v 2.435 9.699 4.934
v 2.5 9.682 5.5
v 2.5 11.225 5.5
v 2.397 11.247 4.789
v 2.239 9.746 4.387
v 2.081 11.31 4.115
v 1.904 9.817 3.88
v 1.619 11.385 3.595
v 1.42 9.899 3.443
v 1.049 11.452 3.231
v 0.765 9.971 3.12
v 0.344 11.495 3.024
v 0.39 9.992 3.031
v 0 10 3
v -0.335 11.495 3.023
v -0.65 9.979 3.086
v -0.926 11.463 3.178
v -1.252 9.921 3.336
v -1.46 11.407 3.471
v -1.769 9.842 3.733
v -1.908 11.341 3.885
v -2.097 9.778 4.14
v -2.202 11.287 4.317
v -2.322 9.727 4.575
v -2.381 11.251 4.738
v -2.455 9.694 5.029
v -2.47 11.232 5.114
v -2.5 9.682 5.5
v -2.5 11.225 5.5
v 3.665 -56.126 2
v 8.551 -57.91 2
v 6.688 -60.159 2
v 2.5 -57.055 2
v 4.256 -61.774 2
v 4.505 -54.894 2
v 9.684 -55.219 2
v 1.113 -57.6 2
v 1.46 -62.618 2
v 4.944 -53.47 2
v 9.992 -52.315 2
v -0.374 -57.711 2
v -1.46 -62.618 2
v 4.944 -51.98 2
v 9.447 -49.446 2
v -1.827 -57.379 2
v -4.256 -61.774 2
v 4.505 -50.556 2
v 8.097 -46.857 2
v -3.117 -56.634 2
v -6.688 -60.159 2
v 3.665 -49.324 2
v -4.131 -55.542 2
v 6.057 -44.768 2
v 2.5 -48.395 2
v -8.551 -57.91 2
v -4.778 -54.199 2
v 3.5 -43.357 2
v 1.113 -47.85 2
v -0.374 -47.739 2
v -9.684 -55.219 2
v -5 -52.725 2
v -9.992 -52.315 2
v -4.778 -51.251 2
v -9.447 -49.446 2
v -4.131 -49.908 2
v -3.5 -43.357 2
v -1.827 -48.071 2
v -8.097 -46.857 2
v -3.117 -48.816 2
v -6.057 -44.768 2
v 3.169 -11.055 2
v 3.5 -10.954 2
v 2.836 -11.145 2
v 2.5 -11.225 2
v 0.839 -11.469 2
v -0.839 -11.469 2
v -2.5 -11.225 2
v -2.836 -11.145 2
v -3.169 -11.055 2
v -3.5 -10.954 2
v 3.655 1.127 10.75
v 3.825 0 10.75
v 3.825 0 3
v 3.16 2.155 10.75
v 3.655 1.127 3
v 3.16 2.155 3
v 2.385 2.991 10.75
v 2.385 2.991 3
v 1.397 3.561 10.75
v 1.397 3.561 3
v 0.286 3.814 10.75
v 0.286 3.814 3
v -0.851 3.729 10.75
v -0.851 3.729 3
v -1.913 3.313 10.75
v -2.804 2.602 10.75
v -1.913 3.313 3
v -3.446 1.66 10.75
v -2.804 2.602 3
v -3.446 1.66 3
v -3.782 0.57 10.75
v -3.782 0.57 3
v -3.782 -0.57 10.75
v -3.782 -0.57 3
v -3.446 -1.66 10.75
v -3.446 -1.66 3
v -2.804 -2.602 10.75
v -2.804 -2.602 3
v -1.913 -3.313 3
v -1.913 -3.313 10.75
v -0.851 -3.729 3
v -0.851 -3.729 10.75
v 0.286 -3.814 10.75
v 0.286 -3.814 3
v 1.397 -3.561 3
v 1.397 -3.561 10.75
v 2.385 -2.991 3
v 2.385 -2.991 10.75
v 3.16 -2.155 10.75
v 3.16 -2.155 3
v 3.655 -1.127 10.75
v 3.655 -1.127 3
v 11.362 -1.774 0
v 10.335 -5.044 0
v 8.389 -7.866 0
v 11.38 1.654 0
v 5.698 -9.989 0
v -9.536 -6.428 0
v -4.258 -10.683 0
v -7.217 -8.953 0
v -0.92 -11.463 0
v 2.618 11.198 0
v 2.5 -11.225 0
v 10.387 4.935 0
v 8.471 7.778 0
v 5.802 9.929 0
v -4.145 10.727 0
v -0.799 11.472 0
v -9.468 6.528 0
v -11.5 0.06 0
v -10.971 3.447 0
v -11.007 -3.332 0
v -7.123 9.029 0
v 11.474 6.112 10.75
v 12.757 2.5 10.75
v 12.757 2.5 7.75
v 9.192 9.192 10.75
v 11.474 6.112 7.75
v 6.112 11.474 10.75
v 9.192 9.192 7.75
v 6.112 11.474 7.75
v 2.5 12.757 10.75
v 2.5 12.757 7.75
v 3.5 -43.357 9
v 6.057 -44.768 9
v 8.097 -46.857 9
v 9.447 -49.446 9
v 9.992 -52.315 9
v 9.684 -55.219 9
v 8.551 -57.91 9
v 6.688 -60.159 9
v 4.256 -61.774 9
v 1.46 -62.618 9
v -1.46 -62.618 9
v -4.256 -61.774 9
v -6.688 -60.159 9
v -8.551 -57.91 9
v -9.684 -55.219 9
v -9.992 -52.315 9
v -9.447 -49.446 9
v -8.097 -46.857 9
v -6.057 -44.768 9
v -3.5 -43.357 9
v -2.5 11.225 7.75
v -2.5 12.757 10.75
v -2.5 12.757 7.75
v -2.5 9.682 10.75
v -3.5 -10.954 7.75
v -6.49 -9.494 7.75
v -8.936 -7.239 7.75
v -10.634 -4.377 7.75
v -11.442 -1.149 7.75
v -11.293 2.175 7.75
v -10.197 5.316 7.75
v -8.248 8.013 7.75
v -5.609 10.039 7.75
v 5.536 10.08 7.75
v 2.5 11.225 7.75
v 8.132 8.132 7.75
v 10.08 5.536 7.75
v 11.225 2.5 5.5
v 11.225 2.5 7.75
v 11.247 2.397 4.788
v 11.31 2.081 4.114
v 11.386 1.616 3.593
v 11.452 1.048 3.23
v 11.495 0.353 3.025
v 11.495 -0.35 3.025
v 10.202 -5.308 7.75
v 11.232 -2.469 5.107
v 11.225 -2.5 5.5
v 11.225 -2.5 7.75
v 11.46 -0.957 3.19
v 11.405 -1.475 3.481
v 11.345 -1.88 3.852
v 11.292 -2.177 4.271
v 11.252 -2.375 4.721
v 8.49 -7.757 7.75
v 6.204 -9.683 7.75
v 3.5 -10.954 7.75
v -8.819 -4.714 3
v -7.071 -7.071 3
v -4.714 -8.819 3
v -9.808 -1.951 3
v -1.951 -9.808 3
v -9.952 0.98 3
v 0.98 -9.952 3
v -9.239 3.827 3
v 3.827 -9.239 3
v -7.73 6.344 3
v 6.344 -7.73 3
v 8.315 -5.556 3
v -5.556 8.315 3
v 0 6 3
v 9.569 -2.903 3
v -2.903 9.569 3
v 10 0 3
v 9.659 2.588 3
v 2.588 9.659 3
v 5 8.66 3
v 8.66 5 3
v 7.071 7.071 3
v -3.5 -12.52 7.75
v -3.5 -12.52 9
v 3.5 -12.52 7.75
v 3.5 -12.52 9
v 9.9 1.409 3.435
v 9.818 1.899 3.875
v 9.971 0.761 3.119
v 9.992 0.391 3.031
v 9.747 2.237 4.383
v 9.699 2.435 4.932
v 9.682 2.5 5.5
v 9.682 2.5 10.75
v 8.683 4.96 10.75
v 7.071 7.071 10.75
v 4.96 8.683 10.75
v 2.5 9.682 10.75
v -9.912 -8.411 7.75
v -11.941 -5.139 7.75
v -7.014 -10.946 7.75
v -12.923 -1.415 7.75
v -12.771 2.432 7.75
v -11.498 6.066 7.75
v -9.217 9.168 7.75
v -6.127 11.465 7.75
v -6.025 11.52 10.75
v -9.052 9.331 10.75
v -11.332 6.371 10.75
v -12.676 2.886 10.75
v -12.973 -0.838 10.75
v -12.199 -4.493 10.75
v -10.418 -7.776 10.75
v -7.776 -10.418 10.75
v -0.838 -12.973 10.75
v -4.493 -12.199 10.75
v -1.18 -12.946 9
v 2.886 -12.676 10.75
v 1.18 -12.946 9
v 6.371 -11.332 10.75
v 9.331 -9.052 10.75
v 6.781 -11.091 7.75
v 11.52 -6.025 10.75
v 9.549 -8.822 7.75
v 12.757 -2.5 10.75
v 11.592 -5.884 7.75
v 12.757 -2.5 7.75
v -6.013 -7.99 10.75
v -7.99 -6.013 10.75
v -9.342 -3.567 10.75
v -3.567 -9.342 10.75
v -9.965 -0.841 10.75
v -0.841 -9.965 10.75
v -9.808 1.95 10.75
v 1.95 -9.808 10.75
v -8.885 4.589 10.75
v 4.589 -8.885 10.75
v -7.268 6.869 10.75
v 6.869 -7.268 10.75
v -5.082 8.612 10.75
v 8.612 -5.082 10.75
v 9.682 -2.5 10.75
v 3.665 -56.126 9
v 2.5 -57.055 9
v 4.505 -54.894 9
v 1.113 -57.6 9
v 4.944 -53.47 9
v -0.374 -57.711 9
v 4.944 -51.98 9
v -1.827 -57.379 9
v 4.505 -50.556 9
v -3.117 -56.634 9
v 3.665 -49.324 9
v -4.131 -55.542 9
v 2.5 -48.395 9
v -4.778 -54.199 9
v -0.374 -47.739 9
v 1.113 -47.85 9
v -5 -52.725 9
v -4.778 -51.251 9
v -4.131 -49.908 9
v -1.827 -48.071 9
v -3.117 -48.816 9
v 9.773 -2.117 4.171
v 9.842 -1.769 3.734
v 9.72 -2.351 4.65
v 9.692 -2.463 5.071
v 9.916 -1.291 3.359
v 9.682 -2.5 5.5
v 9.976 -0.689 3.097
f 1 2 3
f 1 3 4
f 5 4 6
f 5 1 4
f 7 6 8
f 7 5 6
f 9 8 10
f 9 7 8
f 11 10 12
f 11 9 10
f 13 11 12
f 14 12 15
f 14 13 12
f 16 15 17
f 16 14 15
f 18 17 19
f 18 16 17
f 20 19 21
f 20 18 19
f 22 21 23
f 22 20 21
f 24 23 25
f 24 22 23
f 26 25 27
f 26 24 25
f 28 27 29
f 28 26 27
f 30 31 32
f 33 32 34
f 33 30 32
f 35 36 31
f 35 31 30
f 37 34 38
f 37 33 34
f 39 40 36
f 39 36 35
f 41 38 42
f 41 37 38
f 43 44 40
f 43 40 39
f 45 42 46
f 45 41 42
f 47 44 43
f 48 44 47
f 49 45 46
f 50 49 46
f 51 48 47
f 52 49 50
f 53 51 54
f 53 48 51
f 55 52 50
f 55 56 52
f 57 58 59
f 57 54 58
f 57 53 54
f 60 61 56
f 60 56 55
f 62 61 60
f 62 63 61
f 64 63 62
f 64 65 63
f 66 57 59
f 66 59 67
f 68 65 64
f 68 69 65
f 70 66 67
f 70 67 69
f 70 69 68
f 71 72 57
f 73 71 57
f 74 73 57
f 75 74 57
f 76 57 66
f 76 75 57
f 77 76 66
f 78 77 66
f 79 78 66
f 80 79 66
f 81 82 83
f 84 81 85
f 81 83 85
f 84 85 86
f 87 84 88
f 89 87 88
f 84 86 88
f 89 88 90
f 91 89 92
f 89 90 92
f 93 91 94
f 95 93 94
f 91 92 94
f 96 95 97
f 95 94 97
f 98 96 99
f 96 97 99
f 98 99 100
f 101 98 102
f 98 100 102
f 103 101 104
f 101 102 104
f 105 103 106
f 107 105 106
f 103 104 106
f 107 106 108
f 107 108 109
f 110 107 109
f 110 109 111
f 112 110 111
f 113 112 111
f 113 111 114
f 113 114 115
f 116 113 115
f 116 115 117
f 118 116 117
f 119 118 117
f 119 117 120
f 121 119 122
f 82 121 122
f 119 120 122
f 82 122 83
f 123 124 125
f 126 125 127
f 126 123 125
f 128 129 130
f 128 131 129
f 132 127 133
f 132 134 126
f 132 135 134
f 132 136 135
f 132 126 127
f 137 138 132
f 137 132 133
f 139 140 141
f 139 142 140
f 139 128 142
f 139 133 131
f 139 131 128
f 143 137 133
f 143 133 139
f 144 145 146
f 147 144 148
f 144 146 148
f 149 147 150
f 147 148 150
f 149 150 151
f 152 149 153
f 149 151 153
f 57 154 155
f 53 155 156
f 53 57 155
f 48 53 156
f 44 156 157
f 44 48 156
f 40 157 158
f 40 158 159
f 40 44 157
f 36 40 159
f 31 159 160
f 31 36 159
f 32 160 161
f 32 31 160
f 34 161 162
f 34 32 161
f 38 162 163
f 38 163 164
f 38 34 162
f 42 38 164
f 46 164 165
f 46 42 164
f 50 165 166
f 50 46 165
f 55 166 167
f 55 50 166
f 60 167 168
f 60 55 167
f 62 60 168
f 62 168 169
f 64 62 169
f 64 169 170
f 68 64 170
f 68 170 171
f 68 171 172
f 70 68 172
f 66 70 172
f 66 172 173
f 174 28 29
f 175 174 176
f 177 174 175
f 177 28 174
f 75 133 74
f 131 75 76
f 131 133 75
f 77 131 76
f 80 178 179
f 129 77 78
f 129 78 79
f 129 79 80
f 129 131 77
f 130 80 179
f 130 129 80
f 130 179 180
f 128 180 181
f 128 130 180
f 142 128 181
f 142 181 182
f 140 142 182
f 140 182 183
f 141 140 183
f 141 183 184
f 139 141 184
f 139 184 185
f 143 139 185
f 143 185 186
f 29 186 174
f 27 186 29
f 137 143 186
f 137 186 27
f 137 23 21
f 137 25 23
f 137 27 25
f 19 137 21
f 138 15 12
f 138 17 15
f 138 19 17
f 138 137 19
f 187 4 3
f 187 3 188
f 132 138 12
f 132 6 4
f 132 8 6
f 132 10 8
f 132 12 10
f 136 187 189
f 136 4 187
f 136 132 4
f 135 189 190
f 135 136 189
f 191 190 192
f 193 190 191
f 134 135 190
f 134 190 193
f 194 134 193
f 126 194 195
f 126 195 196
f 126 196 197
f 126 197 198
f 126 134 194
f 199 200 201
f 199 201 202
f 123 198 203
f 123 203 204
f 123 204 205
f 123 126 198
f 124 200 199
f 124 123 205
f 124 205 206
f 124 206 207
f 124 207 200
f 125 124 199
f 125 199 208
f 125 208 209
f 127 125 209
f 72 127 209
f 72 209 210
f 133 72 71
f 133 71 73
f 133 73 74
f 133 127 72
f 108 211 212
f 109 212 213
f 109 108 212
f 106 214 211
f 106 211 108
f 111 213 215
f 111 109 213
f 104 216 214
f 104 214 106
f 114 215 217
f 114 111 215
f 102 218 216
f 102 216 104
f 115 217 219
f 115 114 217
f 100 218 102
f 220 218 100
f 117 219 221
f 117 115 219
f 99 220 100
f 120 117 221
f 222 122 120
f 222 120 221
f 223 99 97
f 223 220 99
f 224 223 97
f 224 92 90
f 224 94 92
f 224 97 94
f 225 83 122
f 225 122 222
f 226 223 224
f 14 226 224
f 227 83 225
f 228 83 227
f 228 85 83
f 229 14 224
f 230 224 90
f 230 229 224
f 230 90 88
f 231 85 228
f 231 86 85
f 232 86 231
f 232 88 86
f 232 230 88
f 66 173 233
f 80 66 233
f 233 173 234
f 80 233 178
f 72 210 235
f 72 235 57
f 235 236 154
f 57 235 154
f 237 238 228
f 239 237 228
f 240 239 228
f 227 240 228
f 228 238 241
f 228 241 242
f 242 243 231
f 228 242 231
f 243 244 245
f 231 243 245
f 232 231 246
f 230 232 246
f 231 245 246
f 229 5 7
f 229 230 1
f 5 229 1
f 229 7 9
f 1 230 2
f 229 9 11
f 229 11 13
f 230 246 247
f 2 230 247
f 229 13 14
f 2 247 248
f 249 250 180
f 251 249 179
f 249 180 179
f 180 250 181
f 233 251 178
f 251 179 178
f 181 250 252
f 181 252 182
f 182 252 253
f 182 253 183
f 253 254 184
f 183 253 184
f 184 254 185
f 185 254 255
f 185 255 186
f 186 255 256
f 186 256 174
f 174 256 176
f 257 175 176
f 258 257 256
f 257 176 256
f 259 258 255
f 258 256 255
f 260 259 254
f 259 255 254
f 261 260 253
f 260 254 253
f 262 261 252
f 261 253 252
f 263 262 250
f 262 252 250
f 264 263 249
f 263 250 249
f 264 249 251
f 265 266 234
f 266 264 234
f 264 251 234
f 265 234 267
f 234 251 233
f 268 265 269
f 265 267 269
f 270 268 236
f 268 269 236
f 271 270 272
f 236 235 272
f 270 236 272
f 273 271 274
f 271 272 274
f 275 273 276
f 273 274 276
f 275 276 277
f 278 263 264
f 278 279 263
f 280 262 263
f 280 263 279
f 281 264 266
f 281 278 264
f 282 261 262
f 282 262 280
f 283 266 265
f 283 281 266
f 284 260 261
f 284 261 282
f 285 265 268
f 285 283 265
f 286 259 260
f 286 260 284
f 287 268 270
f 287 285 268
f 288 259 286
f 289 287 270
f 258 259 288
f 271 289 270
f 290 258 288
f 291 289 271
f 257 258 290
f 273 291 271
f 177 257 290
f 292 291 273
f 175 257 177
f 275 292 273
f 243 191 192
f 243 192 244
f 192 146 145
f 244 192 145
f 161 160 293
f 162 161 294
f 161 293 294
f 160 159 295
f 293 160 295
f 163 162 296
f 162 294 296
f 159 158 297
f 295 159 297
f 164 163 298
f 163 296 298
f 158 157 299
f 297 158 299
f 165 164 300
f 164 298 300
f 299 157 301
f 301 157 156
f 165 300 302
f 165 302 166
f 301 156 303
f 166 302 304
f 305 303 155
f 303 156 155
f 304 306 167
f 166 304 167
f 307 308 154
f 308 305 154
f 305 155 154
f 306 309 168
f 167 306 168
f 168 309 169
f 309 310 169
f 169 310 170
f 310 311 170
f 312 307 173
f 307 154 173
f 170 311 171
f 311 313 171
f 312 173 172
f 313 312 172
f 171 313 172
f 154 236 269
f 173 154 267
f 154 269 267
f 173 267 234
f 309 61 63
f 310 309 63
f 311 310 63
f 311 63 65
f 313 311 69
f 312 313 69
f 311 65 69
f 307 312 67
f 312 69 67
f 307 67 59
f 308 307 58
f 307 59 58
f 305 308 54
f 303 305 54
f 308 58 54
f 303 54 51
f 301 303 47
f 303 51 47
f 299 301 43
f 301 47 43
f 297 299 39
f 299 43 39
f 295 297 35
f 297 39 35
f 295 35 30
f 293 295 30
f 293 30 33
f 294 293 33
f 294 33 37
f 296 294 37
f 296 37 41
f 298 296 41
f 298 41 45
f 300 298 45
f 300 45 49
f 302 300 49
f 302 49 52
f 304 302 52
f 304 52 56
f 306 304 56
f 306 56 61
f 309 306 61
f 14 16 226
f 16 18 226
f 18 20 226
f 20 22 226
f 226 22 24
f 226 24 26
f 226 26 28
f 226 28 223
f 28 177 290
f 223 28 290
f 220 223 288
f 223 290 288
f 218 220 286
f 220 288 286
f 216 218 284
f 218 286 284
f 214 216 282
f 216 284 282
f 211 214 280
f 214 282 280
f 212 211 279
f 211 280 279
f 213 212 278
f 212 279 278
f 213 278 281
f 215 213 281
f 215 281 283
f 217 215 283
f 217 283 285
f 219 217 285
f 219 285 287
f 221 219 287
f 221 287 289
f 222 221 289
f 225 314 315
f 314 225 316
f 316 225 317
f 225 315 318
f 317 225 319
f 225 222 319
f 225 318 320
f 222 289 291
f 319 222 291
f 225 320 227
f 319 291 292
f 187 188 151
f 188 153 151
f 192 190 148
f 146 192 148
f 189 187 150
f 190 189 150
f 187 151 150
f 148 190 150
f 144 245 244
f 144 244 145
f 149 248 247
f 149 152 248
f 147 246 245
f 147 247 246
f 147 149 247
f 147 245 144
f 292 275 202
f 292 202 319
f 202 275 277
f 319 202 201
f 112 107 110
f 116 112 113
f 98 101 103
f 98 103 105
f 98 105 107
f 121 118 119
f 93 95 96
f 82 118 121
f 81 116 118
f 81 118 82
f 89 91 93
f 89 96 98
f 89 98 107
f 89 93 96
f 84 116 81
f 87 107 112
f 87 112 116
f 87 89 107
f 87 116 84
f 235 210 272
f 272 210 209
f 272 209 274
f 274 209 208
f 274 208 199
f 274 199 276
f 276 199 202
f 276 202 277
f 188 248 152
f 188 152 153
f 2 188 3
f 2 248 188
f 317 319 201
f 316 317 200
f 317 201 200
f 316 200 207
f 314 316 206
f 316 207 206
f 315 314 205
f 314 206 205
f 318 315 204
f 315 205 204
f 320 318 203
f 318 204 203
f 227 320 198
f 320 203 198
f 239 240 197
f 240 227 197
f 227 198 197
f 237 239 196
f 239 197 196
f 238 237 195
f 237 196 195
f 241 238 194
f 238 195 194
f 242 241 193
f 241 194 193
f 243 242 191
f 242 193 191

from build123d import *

# Parameters (mm, degrees)
CROQUIS1_R                  = 10
SALIENTE_EXTRUIR1_DEPTH     = 3
CROQUIS2_R                  = 11.5
CROQUIS2_R_2                = 10
SALIENTE_EXTRUIR3_DEPTH     = 8
SALIENTE_EXTRUIR4_START     = 3
CROQUIS3_R                  = 11.5
CROQUIS3_R_2                = 10
SALIENTE_EXTRUIR4_DEPTH     = 3
CROQUIS12_W                 = 2.5
CROQUIS12_H                 = 0.622045166
SALIENTE_EXTRUIR6_DEPTH     = 3
CROQUIS13_W                 = 5
CROQUIS13_H                 = 50.27502784
SALIENTE_EXTRUIR7_DEPTH     = 8
CROQUIS15_W                 = 2
CROQUIS15_H                 = 50.27502784
CORTAR_EXTRUIR4_DEPTH       = 8
SALIENTE_EXTRUIR8_DEPTH     = 7
CROQUIS21_R                 = 10
SALIENTE_EXTRUIR9_DEPTH     = 7
CROQUIS22_R                 = 5
CORTAR_EXTRUIR5_DEPTH       = 30
CROQUIS23_R                 = 10
SALIENTE_EXTRUIR10_DEPTH    = 1.25
CORTAR_EXTRUIR6_START       = -1.5
CROQUIS24_R                 = 10
CORTAR_EXTRUIR6_DEPTH       = 1.5
SALIENTE_EXTRUIR11_START    = -3
CROQUIS25_R                 = 13
SALIENTE_EXTRUIR11_DEPTH    = 3
CORTAR_EXTRUIR14_START      = -10
CROQUIS30_R                 = 10
CORTAR_EXTRUIR14_DEPTH      = 10
CROQUIS31_R                 = 11.5
CROQUIS31_R_2               = 10
SALIENTE_EXTRUIR12_DEPTH    = 7.75
CROQUIS32_R                 = 10
SALIENTE_EXTRUIR13_DEPTH    = 10.75
CROQUIS34_R                 = 10
CORTAR_EXTRUIR15_DEPTH      = 7.75
CROQUIS36_R                 = 3.825
SALIENTE_EXTRUIR14_DEPTH    = 7.75
CORTAR_EXTRUIR17_DEPTH      = 77.117731129
CORTAR_EXTRUIR17_DEPTH_BACK = 5.5
SALIENTE_EXTRUIR20_DEPTH    = 9.5
CROQUIS42_W                 = 1.65191017
CROQUIS42_H                 = 5
CORTAR_EXTRUIR18_DEPTH      = 0.25
CORTAR_EXTRUIR19_REACH      = 71.382
CORTAR_EXTRUIR20_REACH      = 71.382
CORTAR_EXTRUIR20_END_RADIUS = 10


with BuildPart() as part:
    # Croquis1 → Saliente-Extruir1 (new body)
    with BuildSketch(Plane.XY):
        Circle(CROQUIS1_R)
    extrude(amount=SALIENTE_EXTRUIR1_DEPTH)



with BuildPart() as body_2:
    # Croquis2 → Saliente-Extruir3 (new body)
    with BuildSketch(Plane.XY.offset(3)):
        Circle(CROQUIS2_R)
        Circle(CROQUIS2_R_2, mode=Mode.SUBTRACT)
    extrude(amount=SALIENTE_EXTRUIR3_DEPTH)


with BuildPart() as part_1:
    add(part.part)

    add(body_2.part)  # Saliente-Extruir4 merges body 2
    # Croquis3 → Saliente-Extruir4 (add)
    with BuildSketch(Plane(origin=(0, 0, 3), x_dir=(-1, 0, 0), z_dir=(0, 0, -1)).offset(SALIENTE_EXTRUIR4_START)):
        with Locations(Location((0, 0, 0), (0, 0, 180))):
            Circle(CROQUIS3_R)
        with Locations(Location((0, 0, 0), (0, 0, 180))):
            Circle(CROQUIS3_R_2, mode=Mode.SUBTRACT)
    extrude(amount=-SALIENTE_EXTRUIR4_DEPTH)

    # Croquis12 → Saliente-Extruir6 (add)
    with BuildSketch(Plane.XY.offset(3)):
        with Locations((-1.25, -11.188977417)):
            Rectangle(CROQUIS12_W, CROQUIS12_H)
        with Locations((1.25, -11.188977417)):
            Rectangle(CROQUIS12_W, CROQUIS12_H)
        Polygon((2.5, -11.5), (2.5, -61.5), (-2.5, -61.5), (-2.5, -11.5), (0, -11.5), align=None)
    extrude(amount=-SALIENTE_EXTRUIR6_DEPTH)

    # Croquis13 → Saliente-Extruir7 (add)
    with BuildSketch(Plane.XY.offset(3)):
        with Locations((0, -36.36248608)):
            Rectangle(CROQUIS13_W, CROQUIS13_H)
    extrude(amount=SALIENTE_EXTRUIR7_DEPTH)

    # Croquis15 → Cortar-Extruir4 (cut)
    with BuildSketch(Plane(origin=(2.5, 0, 0), x_dir=(0, 0, -1), z_dir=(1, 0, 0))):
        with Locations((-10, -36.36248608)):
            Rectangle(CROQUIS15_W, CROQUIS15_H)
        with Locations((-1, -36.36248608)):
            Rectangle(CROQUIS15_W, CROQUIS15_H)
    extrude(amount=-CORTAR_EXTRUIR4_DEPTH, mode=Mode.SUBTRACT)

    # Croquis16 → Saliente-Extruir8 (add)
    with BuildSketch(Plane.XY.offset(9)):
        Polygon((-2.5, -61.5), (-3.5, -61.5), (-3.5, -10.232955502), (3.5, -10.232955502), (3.5, -61.5), (2.5, -61.5), align=None)
    extrude(amount=-SALIENTE_EXTRUIR8_DEPTH)

    # Croquis21 → Saliente-Extruir9 (add)
    with BuildSketch(Plane(origin=(0, 0, 2), x_dir=(-1, 0, 0), z_dir=(0, 0, -1))):
        with Locations((0, -52.72497216)):
            Circle(CROQUIS21_R)
    extrude(amount=-SALIENTE_EXTRUIR9_DEPTH)

    # Croquis22 → Cortar-Extruir5 (cut)
    with BuildSketch(Plane(origin=(0, 0, 2), x_dir=(-1, 0, 0), z_dir=(0, 0, -1))):
        with Locations((0, -52.72497216)):
            Circle(CROQUIS22_R)
    extrude(amount=-CORTAR_EXTRUIR5_DEPTH, mode=Mode.SUBTRACT)

    # Croquis23 → Saliente-Extruir10 (add)
    with BuildSketch(Plane.XY.offset(11)):
        with BuildLine():
            Line((-2.5, -11.22497216), (2.5, -11.22497216))
            ThreePointArc((2.5, -11.22497216), (0, 11.5), (-2.5, -11.22497216))
        make_face()
        Circle(CROQUIS23_R, mode=Mode.SUBTRACT)
    extrude(amount=SALIENTE_EXTRUIR10_DEPTH)

    # Croquis24 → Cortar-Extruir6 (cut)
    with BuildSketch(Plane.XY.offset(12.25).offset(CORTAR_EXTRUIR6_START)):
        with BuildLine():
            Line((-2.5, -11.22497216), (2.5, -11.22497216))
            ThreePointArc((2.5, -11.22497216), (0, 11.5), (-2.5, -11.22497216))
        make_face()
        Circle(CROQUIS24_R, mode=Mode.SUBTRACT)
    extrude(amount=CORTAR_EXTRUIR6_DEPTH, mode=Mode.SUBTRACT)

    # Croquis25 → Saliente-Extruir11 (add)
    with BuildSketch(Plane.XY.offset(10.75).offset(SALIENTE_EXTRUIR11_START)):
        Circle(CROQUIS25_R)
        with BuildLine():
            ThreePointArc((2.5, -11.22497216), (0, 11.5), (-2.5, -11.22497216))
            Line((-2.5, -11.22497216), (2.5, -11.22497216))
        make_face(mode=Mode.SUBTRACT)
    extrude(amount=SALIENTE_EXTRUIR11_DEPTH)

    # Croquis30 → Cortar-Extruir14 (cut)
    with BuildSketch(Plane.XY.offset(3).offset(CORTAR_EXTRUIR14_START)):
        Circle(CROQUIS30_R)
    extrude(amount=CORTAR_EXTRUIR14_DEPTH, mode=Mode.SUBTRACT)

    # Croquis31 → Saliente-Extruir12 (add)
    with BuildSketch(Plane(origin=(0, 0, 0), x_dir=(-1, 0, 0), z_dir=(0, 0, -1))):
        with Locations(Location((0, 0, 0), (0, 0, 180))):
            Circle(CROQUIS31_R)
        with Locations(Location((0, 0, 0), (0, 0, 180))):
            Circle(CROQUIS31_R_2, mode=Mode.SUBTRACT)
    extrude(amount=-SALIENTE_EXTRUIR12_DEPTH)

    # Croquis32 → Saliente-Extruir13 (add)
    with BuildSketch(Plane(origin=(0, 0, 0), x_dir=(-1, 0, 0), z_dir=(0, 0, -1))):
        Circle(CROQUIS32_R)
    extrude(amount=-SALIENTE_EXTRUIR13_DEPTH)

    # Croquis34 → Cortar-Extruir15 (cut)
    with BuildSketch(Plane.XY.offset(10.75)):
        Circle(CROQUIS34_R)
    extrude(amount=-CORTAR_EXTRUIR15_DEPTH, mode=Mode.SUBTRACT)

    # Croquis36 → Saliente-Extruir14 (add)
    with BuildSketch(Plane.XY.offset(3)):
        Circle(CROQUIS36_R)
    extrude(amount=SALIENTE_EXTRUIR14_DEPTH)

    # Croquis40 → Cortar-Extruir17 (cut, two sides: drawn at the far end of the back side and taken through both)
    with BuildSketch(Plane(origin=(0, 11.5, 0), x_dir=(1, 0, 0), z_dir=(0, 1, 0)).offset(-CORTAR_EXTRUIR17_DEPTH_BACK)):
        with BuildLine():
            Line((-2.5, -5.5), (-2.5, -10.75))
            Line((-2.5, -10.75), (0, -10.75))
            Line((0, -10.75), (2.5, -10.75))
            Line((2.5, -10.75), (2.5, -5.5))
            ThreePointArc((2.5, -5.5), (0, -3), (-2.5, -5.5))
        make_face()
        with BuildLine():
            Line((0, -10.75), (-2.5, -10.75))
            ThreePointArc((-2.5, -10.75), (0, -13.25), (2.5, -10.75))
            Line((2.5, -10.75), (0, -10.75))
        make_face()
    extrude(amount=CORTAR_EXTRUIR17_DEPTH + CORTAR_EXTRUIR17_DEPTH_BACK, mode=Mode.SUBTRACT)

    # Croquis7 → Saliente-Extruir20 (add)
    with BuildSketch(Plane.XY.offset(11)):
        Polygon((14.638643631, -2.5), (12.986733461, -2.5), (12.986733461, 0), (12.986733461, 2.5), (14.638643631, 2.5), align=None)
    extrude(amount=-SALIENTE_EXTRUIR20_DEPTH)

    # Croquis42 → Cortar-Extruir18 (cut)
    with BuildSketch(Plane.XY.offset(11)):
        with Locations((13.812688546, 0)):
            Rectangle(CROQUIS42_W, CROQUIS42_H)
    extrude(amount=-CORTAR_EXTRUIR18_DEPTH, mode=Mode.SUBTRACT)

    # Croquis43 → Cortar-Extruir19 (cut, up to next)
    with BuildSketch(Plane(origin=(14.638643631, 0, 0), x_dir=(0, 0, -1), z_dir=(1, 0, 0)), mode=Mode.PRIVATE) as cortar_extruir19_sk1:
        with BuildLine():
            Line((-1.5, 2.5), (-5.5, 2.5))
            ThreePointArc((-5.5, 2.5), (-3, 0), (-5.5, -2.5))
            Line((-5.5, -2.5), (-1.5, -2.5))
            Line((-1.5, -2.5), (-1.5, 2.5))
        make_face()
    cortar_extruir19_tool1 = extrude(cortar_extruir19_sk1.sketch, amount=-CORTAR_EXTRUIR19_REACH, mode=Mode.PRIVATE) & part_1.part
    add(cortar_extruir19_tool1.solids().sort_by_distance((14.638644, 0, 2.594695))[0], mode=Mode.SUBTRACT)

    # Cortar-Extruir20: up to this cylinder (the profile starts outside it)
    cortar_extruir20_end = Plane(origin=(0, 0, 7.121671), z_dir=(0, 0, 1)) * Cylinder(CORTAR_EXTRUIR20_END_RADIUS, 163.764, mode=Mode.PRIVATE)
    # Croquis44 → Cortar-Extruir20 (cut, up to the surface)
    with BuildSketch(Plane(origin=(14.638643631, 0, 0), x_dir=(0, 0, -1), z_dir=(1, 0, 0)), mode=Mode.PRIVATE) as cortar_extruir20_sk1:
        with BuildLine():
            Line((-5.5, 2.5), (-10.75, 2.5))
            Line((-10.75, 2.5), (-10.75, -2.5))
            Line((-10.75, -2.5), (-5.5, -2.5))
            ThreePointArc((-5.5, -2.5), (-3, 0), (-5.5, 2.5))
        make_face()
    cortar_extruir20_tool1 = extrude(cortar_extruir20_sk1.sketch, amount=-CORTAR_EXTRUIR20_REACH, mode=Mode.PRIVATE) - cortar_extruir20_end
    add(cortar_extruir20_tool1.solids().sort_by_distance((14.638644, 0, 7.121671))[0], mode=Mode.SUBTRACT)


solid = part_1.part
